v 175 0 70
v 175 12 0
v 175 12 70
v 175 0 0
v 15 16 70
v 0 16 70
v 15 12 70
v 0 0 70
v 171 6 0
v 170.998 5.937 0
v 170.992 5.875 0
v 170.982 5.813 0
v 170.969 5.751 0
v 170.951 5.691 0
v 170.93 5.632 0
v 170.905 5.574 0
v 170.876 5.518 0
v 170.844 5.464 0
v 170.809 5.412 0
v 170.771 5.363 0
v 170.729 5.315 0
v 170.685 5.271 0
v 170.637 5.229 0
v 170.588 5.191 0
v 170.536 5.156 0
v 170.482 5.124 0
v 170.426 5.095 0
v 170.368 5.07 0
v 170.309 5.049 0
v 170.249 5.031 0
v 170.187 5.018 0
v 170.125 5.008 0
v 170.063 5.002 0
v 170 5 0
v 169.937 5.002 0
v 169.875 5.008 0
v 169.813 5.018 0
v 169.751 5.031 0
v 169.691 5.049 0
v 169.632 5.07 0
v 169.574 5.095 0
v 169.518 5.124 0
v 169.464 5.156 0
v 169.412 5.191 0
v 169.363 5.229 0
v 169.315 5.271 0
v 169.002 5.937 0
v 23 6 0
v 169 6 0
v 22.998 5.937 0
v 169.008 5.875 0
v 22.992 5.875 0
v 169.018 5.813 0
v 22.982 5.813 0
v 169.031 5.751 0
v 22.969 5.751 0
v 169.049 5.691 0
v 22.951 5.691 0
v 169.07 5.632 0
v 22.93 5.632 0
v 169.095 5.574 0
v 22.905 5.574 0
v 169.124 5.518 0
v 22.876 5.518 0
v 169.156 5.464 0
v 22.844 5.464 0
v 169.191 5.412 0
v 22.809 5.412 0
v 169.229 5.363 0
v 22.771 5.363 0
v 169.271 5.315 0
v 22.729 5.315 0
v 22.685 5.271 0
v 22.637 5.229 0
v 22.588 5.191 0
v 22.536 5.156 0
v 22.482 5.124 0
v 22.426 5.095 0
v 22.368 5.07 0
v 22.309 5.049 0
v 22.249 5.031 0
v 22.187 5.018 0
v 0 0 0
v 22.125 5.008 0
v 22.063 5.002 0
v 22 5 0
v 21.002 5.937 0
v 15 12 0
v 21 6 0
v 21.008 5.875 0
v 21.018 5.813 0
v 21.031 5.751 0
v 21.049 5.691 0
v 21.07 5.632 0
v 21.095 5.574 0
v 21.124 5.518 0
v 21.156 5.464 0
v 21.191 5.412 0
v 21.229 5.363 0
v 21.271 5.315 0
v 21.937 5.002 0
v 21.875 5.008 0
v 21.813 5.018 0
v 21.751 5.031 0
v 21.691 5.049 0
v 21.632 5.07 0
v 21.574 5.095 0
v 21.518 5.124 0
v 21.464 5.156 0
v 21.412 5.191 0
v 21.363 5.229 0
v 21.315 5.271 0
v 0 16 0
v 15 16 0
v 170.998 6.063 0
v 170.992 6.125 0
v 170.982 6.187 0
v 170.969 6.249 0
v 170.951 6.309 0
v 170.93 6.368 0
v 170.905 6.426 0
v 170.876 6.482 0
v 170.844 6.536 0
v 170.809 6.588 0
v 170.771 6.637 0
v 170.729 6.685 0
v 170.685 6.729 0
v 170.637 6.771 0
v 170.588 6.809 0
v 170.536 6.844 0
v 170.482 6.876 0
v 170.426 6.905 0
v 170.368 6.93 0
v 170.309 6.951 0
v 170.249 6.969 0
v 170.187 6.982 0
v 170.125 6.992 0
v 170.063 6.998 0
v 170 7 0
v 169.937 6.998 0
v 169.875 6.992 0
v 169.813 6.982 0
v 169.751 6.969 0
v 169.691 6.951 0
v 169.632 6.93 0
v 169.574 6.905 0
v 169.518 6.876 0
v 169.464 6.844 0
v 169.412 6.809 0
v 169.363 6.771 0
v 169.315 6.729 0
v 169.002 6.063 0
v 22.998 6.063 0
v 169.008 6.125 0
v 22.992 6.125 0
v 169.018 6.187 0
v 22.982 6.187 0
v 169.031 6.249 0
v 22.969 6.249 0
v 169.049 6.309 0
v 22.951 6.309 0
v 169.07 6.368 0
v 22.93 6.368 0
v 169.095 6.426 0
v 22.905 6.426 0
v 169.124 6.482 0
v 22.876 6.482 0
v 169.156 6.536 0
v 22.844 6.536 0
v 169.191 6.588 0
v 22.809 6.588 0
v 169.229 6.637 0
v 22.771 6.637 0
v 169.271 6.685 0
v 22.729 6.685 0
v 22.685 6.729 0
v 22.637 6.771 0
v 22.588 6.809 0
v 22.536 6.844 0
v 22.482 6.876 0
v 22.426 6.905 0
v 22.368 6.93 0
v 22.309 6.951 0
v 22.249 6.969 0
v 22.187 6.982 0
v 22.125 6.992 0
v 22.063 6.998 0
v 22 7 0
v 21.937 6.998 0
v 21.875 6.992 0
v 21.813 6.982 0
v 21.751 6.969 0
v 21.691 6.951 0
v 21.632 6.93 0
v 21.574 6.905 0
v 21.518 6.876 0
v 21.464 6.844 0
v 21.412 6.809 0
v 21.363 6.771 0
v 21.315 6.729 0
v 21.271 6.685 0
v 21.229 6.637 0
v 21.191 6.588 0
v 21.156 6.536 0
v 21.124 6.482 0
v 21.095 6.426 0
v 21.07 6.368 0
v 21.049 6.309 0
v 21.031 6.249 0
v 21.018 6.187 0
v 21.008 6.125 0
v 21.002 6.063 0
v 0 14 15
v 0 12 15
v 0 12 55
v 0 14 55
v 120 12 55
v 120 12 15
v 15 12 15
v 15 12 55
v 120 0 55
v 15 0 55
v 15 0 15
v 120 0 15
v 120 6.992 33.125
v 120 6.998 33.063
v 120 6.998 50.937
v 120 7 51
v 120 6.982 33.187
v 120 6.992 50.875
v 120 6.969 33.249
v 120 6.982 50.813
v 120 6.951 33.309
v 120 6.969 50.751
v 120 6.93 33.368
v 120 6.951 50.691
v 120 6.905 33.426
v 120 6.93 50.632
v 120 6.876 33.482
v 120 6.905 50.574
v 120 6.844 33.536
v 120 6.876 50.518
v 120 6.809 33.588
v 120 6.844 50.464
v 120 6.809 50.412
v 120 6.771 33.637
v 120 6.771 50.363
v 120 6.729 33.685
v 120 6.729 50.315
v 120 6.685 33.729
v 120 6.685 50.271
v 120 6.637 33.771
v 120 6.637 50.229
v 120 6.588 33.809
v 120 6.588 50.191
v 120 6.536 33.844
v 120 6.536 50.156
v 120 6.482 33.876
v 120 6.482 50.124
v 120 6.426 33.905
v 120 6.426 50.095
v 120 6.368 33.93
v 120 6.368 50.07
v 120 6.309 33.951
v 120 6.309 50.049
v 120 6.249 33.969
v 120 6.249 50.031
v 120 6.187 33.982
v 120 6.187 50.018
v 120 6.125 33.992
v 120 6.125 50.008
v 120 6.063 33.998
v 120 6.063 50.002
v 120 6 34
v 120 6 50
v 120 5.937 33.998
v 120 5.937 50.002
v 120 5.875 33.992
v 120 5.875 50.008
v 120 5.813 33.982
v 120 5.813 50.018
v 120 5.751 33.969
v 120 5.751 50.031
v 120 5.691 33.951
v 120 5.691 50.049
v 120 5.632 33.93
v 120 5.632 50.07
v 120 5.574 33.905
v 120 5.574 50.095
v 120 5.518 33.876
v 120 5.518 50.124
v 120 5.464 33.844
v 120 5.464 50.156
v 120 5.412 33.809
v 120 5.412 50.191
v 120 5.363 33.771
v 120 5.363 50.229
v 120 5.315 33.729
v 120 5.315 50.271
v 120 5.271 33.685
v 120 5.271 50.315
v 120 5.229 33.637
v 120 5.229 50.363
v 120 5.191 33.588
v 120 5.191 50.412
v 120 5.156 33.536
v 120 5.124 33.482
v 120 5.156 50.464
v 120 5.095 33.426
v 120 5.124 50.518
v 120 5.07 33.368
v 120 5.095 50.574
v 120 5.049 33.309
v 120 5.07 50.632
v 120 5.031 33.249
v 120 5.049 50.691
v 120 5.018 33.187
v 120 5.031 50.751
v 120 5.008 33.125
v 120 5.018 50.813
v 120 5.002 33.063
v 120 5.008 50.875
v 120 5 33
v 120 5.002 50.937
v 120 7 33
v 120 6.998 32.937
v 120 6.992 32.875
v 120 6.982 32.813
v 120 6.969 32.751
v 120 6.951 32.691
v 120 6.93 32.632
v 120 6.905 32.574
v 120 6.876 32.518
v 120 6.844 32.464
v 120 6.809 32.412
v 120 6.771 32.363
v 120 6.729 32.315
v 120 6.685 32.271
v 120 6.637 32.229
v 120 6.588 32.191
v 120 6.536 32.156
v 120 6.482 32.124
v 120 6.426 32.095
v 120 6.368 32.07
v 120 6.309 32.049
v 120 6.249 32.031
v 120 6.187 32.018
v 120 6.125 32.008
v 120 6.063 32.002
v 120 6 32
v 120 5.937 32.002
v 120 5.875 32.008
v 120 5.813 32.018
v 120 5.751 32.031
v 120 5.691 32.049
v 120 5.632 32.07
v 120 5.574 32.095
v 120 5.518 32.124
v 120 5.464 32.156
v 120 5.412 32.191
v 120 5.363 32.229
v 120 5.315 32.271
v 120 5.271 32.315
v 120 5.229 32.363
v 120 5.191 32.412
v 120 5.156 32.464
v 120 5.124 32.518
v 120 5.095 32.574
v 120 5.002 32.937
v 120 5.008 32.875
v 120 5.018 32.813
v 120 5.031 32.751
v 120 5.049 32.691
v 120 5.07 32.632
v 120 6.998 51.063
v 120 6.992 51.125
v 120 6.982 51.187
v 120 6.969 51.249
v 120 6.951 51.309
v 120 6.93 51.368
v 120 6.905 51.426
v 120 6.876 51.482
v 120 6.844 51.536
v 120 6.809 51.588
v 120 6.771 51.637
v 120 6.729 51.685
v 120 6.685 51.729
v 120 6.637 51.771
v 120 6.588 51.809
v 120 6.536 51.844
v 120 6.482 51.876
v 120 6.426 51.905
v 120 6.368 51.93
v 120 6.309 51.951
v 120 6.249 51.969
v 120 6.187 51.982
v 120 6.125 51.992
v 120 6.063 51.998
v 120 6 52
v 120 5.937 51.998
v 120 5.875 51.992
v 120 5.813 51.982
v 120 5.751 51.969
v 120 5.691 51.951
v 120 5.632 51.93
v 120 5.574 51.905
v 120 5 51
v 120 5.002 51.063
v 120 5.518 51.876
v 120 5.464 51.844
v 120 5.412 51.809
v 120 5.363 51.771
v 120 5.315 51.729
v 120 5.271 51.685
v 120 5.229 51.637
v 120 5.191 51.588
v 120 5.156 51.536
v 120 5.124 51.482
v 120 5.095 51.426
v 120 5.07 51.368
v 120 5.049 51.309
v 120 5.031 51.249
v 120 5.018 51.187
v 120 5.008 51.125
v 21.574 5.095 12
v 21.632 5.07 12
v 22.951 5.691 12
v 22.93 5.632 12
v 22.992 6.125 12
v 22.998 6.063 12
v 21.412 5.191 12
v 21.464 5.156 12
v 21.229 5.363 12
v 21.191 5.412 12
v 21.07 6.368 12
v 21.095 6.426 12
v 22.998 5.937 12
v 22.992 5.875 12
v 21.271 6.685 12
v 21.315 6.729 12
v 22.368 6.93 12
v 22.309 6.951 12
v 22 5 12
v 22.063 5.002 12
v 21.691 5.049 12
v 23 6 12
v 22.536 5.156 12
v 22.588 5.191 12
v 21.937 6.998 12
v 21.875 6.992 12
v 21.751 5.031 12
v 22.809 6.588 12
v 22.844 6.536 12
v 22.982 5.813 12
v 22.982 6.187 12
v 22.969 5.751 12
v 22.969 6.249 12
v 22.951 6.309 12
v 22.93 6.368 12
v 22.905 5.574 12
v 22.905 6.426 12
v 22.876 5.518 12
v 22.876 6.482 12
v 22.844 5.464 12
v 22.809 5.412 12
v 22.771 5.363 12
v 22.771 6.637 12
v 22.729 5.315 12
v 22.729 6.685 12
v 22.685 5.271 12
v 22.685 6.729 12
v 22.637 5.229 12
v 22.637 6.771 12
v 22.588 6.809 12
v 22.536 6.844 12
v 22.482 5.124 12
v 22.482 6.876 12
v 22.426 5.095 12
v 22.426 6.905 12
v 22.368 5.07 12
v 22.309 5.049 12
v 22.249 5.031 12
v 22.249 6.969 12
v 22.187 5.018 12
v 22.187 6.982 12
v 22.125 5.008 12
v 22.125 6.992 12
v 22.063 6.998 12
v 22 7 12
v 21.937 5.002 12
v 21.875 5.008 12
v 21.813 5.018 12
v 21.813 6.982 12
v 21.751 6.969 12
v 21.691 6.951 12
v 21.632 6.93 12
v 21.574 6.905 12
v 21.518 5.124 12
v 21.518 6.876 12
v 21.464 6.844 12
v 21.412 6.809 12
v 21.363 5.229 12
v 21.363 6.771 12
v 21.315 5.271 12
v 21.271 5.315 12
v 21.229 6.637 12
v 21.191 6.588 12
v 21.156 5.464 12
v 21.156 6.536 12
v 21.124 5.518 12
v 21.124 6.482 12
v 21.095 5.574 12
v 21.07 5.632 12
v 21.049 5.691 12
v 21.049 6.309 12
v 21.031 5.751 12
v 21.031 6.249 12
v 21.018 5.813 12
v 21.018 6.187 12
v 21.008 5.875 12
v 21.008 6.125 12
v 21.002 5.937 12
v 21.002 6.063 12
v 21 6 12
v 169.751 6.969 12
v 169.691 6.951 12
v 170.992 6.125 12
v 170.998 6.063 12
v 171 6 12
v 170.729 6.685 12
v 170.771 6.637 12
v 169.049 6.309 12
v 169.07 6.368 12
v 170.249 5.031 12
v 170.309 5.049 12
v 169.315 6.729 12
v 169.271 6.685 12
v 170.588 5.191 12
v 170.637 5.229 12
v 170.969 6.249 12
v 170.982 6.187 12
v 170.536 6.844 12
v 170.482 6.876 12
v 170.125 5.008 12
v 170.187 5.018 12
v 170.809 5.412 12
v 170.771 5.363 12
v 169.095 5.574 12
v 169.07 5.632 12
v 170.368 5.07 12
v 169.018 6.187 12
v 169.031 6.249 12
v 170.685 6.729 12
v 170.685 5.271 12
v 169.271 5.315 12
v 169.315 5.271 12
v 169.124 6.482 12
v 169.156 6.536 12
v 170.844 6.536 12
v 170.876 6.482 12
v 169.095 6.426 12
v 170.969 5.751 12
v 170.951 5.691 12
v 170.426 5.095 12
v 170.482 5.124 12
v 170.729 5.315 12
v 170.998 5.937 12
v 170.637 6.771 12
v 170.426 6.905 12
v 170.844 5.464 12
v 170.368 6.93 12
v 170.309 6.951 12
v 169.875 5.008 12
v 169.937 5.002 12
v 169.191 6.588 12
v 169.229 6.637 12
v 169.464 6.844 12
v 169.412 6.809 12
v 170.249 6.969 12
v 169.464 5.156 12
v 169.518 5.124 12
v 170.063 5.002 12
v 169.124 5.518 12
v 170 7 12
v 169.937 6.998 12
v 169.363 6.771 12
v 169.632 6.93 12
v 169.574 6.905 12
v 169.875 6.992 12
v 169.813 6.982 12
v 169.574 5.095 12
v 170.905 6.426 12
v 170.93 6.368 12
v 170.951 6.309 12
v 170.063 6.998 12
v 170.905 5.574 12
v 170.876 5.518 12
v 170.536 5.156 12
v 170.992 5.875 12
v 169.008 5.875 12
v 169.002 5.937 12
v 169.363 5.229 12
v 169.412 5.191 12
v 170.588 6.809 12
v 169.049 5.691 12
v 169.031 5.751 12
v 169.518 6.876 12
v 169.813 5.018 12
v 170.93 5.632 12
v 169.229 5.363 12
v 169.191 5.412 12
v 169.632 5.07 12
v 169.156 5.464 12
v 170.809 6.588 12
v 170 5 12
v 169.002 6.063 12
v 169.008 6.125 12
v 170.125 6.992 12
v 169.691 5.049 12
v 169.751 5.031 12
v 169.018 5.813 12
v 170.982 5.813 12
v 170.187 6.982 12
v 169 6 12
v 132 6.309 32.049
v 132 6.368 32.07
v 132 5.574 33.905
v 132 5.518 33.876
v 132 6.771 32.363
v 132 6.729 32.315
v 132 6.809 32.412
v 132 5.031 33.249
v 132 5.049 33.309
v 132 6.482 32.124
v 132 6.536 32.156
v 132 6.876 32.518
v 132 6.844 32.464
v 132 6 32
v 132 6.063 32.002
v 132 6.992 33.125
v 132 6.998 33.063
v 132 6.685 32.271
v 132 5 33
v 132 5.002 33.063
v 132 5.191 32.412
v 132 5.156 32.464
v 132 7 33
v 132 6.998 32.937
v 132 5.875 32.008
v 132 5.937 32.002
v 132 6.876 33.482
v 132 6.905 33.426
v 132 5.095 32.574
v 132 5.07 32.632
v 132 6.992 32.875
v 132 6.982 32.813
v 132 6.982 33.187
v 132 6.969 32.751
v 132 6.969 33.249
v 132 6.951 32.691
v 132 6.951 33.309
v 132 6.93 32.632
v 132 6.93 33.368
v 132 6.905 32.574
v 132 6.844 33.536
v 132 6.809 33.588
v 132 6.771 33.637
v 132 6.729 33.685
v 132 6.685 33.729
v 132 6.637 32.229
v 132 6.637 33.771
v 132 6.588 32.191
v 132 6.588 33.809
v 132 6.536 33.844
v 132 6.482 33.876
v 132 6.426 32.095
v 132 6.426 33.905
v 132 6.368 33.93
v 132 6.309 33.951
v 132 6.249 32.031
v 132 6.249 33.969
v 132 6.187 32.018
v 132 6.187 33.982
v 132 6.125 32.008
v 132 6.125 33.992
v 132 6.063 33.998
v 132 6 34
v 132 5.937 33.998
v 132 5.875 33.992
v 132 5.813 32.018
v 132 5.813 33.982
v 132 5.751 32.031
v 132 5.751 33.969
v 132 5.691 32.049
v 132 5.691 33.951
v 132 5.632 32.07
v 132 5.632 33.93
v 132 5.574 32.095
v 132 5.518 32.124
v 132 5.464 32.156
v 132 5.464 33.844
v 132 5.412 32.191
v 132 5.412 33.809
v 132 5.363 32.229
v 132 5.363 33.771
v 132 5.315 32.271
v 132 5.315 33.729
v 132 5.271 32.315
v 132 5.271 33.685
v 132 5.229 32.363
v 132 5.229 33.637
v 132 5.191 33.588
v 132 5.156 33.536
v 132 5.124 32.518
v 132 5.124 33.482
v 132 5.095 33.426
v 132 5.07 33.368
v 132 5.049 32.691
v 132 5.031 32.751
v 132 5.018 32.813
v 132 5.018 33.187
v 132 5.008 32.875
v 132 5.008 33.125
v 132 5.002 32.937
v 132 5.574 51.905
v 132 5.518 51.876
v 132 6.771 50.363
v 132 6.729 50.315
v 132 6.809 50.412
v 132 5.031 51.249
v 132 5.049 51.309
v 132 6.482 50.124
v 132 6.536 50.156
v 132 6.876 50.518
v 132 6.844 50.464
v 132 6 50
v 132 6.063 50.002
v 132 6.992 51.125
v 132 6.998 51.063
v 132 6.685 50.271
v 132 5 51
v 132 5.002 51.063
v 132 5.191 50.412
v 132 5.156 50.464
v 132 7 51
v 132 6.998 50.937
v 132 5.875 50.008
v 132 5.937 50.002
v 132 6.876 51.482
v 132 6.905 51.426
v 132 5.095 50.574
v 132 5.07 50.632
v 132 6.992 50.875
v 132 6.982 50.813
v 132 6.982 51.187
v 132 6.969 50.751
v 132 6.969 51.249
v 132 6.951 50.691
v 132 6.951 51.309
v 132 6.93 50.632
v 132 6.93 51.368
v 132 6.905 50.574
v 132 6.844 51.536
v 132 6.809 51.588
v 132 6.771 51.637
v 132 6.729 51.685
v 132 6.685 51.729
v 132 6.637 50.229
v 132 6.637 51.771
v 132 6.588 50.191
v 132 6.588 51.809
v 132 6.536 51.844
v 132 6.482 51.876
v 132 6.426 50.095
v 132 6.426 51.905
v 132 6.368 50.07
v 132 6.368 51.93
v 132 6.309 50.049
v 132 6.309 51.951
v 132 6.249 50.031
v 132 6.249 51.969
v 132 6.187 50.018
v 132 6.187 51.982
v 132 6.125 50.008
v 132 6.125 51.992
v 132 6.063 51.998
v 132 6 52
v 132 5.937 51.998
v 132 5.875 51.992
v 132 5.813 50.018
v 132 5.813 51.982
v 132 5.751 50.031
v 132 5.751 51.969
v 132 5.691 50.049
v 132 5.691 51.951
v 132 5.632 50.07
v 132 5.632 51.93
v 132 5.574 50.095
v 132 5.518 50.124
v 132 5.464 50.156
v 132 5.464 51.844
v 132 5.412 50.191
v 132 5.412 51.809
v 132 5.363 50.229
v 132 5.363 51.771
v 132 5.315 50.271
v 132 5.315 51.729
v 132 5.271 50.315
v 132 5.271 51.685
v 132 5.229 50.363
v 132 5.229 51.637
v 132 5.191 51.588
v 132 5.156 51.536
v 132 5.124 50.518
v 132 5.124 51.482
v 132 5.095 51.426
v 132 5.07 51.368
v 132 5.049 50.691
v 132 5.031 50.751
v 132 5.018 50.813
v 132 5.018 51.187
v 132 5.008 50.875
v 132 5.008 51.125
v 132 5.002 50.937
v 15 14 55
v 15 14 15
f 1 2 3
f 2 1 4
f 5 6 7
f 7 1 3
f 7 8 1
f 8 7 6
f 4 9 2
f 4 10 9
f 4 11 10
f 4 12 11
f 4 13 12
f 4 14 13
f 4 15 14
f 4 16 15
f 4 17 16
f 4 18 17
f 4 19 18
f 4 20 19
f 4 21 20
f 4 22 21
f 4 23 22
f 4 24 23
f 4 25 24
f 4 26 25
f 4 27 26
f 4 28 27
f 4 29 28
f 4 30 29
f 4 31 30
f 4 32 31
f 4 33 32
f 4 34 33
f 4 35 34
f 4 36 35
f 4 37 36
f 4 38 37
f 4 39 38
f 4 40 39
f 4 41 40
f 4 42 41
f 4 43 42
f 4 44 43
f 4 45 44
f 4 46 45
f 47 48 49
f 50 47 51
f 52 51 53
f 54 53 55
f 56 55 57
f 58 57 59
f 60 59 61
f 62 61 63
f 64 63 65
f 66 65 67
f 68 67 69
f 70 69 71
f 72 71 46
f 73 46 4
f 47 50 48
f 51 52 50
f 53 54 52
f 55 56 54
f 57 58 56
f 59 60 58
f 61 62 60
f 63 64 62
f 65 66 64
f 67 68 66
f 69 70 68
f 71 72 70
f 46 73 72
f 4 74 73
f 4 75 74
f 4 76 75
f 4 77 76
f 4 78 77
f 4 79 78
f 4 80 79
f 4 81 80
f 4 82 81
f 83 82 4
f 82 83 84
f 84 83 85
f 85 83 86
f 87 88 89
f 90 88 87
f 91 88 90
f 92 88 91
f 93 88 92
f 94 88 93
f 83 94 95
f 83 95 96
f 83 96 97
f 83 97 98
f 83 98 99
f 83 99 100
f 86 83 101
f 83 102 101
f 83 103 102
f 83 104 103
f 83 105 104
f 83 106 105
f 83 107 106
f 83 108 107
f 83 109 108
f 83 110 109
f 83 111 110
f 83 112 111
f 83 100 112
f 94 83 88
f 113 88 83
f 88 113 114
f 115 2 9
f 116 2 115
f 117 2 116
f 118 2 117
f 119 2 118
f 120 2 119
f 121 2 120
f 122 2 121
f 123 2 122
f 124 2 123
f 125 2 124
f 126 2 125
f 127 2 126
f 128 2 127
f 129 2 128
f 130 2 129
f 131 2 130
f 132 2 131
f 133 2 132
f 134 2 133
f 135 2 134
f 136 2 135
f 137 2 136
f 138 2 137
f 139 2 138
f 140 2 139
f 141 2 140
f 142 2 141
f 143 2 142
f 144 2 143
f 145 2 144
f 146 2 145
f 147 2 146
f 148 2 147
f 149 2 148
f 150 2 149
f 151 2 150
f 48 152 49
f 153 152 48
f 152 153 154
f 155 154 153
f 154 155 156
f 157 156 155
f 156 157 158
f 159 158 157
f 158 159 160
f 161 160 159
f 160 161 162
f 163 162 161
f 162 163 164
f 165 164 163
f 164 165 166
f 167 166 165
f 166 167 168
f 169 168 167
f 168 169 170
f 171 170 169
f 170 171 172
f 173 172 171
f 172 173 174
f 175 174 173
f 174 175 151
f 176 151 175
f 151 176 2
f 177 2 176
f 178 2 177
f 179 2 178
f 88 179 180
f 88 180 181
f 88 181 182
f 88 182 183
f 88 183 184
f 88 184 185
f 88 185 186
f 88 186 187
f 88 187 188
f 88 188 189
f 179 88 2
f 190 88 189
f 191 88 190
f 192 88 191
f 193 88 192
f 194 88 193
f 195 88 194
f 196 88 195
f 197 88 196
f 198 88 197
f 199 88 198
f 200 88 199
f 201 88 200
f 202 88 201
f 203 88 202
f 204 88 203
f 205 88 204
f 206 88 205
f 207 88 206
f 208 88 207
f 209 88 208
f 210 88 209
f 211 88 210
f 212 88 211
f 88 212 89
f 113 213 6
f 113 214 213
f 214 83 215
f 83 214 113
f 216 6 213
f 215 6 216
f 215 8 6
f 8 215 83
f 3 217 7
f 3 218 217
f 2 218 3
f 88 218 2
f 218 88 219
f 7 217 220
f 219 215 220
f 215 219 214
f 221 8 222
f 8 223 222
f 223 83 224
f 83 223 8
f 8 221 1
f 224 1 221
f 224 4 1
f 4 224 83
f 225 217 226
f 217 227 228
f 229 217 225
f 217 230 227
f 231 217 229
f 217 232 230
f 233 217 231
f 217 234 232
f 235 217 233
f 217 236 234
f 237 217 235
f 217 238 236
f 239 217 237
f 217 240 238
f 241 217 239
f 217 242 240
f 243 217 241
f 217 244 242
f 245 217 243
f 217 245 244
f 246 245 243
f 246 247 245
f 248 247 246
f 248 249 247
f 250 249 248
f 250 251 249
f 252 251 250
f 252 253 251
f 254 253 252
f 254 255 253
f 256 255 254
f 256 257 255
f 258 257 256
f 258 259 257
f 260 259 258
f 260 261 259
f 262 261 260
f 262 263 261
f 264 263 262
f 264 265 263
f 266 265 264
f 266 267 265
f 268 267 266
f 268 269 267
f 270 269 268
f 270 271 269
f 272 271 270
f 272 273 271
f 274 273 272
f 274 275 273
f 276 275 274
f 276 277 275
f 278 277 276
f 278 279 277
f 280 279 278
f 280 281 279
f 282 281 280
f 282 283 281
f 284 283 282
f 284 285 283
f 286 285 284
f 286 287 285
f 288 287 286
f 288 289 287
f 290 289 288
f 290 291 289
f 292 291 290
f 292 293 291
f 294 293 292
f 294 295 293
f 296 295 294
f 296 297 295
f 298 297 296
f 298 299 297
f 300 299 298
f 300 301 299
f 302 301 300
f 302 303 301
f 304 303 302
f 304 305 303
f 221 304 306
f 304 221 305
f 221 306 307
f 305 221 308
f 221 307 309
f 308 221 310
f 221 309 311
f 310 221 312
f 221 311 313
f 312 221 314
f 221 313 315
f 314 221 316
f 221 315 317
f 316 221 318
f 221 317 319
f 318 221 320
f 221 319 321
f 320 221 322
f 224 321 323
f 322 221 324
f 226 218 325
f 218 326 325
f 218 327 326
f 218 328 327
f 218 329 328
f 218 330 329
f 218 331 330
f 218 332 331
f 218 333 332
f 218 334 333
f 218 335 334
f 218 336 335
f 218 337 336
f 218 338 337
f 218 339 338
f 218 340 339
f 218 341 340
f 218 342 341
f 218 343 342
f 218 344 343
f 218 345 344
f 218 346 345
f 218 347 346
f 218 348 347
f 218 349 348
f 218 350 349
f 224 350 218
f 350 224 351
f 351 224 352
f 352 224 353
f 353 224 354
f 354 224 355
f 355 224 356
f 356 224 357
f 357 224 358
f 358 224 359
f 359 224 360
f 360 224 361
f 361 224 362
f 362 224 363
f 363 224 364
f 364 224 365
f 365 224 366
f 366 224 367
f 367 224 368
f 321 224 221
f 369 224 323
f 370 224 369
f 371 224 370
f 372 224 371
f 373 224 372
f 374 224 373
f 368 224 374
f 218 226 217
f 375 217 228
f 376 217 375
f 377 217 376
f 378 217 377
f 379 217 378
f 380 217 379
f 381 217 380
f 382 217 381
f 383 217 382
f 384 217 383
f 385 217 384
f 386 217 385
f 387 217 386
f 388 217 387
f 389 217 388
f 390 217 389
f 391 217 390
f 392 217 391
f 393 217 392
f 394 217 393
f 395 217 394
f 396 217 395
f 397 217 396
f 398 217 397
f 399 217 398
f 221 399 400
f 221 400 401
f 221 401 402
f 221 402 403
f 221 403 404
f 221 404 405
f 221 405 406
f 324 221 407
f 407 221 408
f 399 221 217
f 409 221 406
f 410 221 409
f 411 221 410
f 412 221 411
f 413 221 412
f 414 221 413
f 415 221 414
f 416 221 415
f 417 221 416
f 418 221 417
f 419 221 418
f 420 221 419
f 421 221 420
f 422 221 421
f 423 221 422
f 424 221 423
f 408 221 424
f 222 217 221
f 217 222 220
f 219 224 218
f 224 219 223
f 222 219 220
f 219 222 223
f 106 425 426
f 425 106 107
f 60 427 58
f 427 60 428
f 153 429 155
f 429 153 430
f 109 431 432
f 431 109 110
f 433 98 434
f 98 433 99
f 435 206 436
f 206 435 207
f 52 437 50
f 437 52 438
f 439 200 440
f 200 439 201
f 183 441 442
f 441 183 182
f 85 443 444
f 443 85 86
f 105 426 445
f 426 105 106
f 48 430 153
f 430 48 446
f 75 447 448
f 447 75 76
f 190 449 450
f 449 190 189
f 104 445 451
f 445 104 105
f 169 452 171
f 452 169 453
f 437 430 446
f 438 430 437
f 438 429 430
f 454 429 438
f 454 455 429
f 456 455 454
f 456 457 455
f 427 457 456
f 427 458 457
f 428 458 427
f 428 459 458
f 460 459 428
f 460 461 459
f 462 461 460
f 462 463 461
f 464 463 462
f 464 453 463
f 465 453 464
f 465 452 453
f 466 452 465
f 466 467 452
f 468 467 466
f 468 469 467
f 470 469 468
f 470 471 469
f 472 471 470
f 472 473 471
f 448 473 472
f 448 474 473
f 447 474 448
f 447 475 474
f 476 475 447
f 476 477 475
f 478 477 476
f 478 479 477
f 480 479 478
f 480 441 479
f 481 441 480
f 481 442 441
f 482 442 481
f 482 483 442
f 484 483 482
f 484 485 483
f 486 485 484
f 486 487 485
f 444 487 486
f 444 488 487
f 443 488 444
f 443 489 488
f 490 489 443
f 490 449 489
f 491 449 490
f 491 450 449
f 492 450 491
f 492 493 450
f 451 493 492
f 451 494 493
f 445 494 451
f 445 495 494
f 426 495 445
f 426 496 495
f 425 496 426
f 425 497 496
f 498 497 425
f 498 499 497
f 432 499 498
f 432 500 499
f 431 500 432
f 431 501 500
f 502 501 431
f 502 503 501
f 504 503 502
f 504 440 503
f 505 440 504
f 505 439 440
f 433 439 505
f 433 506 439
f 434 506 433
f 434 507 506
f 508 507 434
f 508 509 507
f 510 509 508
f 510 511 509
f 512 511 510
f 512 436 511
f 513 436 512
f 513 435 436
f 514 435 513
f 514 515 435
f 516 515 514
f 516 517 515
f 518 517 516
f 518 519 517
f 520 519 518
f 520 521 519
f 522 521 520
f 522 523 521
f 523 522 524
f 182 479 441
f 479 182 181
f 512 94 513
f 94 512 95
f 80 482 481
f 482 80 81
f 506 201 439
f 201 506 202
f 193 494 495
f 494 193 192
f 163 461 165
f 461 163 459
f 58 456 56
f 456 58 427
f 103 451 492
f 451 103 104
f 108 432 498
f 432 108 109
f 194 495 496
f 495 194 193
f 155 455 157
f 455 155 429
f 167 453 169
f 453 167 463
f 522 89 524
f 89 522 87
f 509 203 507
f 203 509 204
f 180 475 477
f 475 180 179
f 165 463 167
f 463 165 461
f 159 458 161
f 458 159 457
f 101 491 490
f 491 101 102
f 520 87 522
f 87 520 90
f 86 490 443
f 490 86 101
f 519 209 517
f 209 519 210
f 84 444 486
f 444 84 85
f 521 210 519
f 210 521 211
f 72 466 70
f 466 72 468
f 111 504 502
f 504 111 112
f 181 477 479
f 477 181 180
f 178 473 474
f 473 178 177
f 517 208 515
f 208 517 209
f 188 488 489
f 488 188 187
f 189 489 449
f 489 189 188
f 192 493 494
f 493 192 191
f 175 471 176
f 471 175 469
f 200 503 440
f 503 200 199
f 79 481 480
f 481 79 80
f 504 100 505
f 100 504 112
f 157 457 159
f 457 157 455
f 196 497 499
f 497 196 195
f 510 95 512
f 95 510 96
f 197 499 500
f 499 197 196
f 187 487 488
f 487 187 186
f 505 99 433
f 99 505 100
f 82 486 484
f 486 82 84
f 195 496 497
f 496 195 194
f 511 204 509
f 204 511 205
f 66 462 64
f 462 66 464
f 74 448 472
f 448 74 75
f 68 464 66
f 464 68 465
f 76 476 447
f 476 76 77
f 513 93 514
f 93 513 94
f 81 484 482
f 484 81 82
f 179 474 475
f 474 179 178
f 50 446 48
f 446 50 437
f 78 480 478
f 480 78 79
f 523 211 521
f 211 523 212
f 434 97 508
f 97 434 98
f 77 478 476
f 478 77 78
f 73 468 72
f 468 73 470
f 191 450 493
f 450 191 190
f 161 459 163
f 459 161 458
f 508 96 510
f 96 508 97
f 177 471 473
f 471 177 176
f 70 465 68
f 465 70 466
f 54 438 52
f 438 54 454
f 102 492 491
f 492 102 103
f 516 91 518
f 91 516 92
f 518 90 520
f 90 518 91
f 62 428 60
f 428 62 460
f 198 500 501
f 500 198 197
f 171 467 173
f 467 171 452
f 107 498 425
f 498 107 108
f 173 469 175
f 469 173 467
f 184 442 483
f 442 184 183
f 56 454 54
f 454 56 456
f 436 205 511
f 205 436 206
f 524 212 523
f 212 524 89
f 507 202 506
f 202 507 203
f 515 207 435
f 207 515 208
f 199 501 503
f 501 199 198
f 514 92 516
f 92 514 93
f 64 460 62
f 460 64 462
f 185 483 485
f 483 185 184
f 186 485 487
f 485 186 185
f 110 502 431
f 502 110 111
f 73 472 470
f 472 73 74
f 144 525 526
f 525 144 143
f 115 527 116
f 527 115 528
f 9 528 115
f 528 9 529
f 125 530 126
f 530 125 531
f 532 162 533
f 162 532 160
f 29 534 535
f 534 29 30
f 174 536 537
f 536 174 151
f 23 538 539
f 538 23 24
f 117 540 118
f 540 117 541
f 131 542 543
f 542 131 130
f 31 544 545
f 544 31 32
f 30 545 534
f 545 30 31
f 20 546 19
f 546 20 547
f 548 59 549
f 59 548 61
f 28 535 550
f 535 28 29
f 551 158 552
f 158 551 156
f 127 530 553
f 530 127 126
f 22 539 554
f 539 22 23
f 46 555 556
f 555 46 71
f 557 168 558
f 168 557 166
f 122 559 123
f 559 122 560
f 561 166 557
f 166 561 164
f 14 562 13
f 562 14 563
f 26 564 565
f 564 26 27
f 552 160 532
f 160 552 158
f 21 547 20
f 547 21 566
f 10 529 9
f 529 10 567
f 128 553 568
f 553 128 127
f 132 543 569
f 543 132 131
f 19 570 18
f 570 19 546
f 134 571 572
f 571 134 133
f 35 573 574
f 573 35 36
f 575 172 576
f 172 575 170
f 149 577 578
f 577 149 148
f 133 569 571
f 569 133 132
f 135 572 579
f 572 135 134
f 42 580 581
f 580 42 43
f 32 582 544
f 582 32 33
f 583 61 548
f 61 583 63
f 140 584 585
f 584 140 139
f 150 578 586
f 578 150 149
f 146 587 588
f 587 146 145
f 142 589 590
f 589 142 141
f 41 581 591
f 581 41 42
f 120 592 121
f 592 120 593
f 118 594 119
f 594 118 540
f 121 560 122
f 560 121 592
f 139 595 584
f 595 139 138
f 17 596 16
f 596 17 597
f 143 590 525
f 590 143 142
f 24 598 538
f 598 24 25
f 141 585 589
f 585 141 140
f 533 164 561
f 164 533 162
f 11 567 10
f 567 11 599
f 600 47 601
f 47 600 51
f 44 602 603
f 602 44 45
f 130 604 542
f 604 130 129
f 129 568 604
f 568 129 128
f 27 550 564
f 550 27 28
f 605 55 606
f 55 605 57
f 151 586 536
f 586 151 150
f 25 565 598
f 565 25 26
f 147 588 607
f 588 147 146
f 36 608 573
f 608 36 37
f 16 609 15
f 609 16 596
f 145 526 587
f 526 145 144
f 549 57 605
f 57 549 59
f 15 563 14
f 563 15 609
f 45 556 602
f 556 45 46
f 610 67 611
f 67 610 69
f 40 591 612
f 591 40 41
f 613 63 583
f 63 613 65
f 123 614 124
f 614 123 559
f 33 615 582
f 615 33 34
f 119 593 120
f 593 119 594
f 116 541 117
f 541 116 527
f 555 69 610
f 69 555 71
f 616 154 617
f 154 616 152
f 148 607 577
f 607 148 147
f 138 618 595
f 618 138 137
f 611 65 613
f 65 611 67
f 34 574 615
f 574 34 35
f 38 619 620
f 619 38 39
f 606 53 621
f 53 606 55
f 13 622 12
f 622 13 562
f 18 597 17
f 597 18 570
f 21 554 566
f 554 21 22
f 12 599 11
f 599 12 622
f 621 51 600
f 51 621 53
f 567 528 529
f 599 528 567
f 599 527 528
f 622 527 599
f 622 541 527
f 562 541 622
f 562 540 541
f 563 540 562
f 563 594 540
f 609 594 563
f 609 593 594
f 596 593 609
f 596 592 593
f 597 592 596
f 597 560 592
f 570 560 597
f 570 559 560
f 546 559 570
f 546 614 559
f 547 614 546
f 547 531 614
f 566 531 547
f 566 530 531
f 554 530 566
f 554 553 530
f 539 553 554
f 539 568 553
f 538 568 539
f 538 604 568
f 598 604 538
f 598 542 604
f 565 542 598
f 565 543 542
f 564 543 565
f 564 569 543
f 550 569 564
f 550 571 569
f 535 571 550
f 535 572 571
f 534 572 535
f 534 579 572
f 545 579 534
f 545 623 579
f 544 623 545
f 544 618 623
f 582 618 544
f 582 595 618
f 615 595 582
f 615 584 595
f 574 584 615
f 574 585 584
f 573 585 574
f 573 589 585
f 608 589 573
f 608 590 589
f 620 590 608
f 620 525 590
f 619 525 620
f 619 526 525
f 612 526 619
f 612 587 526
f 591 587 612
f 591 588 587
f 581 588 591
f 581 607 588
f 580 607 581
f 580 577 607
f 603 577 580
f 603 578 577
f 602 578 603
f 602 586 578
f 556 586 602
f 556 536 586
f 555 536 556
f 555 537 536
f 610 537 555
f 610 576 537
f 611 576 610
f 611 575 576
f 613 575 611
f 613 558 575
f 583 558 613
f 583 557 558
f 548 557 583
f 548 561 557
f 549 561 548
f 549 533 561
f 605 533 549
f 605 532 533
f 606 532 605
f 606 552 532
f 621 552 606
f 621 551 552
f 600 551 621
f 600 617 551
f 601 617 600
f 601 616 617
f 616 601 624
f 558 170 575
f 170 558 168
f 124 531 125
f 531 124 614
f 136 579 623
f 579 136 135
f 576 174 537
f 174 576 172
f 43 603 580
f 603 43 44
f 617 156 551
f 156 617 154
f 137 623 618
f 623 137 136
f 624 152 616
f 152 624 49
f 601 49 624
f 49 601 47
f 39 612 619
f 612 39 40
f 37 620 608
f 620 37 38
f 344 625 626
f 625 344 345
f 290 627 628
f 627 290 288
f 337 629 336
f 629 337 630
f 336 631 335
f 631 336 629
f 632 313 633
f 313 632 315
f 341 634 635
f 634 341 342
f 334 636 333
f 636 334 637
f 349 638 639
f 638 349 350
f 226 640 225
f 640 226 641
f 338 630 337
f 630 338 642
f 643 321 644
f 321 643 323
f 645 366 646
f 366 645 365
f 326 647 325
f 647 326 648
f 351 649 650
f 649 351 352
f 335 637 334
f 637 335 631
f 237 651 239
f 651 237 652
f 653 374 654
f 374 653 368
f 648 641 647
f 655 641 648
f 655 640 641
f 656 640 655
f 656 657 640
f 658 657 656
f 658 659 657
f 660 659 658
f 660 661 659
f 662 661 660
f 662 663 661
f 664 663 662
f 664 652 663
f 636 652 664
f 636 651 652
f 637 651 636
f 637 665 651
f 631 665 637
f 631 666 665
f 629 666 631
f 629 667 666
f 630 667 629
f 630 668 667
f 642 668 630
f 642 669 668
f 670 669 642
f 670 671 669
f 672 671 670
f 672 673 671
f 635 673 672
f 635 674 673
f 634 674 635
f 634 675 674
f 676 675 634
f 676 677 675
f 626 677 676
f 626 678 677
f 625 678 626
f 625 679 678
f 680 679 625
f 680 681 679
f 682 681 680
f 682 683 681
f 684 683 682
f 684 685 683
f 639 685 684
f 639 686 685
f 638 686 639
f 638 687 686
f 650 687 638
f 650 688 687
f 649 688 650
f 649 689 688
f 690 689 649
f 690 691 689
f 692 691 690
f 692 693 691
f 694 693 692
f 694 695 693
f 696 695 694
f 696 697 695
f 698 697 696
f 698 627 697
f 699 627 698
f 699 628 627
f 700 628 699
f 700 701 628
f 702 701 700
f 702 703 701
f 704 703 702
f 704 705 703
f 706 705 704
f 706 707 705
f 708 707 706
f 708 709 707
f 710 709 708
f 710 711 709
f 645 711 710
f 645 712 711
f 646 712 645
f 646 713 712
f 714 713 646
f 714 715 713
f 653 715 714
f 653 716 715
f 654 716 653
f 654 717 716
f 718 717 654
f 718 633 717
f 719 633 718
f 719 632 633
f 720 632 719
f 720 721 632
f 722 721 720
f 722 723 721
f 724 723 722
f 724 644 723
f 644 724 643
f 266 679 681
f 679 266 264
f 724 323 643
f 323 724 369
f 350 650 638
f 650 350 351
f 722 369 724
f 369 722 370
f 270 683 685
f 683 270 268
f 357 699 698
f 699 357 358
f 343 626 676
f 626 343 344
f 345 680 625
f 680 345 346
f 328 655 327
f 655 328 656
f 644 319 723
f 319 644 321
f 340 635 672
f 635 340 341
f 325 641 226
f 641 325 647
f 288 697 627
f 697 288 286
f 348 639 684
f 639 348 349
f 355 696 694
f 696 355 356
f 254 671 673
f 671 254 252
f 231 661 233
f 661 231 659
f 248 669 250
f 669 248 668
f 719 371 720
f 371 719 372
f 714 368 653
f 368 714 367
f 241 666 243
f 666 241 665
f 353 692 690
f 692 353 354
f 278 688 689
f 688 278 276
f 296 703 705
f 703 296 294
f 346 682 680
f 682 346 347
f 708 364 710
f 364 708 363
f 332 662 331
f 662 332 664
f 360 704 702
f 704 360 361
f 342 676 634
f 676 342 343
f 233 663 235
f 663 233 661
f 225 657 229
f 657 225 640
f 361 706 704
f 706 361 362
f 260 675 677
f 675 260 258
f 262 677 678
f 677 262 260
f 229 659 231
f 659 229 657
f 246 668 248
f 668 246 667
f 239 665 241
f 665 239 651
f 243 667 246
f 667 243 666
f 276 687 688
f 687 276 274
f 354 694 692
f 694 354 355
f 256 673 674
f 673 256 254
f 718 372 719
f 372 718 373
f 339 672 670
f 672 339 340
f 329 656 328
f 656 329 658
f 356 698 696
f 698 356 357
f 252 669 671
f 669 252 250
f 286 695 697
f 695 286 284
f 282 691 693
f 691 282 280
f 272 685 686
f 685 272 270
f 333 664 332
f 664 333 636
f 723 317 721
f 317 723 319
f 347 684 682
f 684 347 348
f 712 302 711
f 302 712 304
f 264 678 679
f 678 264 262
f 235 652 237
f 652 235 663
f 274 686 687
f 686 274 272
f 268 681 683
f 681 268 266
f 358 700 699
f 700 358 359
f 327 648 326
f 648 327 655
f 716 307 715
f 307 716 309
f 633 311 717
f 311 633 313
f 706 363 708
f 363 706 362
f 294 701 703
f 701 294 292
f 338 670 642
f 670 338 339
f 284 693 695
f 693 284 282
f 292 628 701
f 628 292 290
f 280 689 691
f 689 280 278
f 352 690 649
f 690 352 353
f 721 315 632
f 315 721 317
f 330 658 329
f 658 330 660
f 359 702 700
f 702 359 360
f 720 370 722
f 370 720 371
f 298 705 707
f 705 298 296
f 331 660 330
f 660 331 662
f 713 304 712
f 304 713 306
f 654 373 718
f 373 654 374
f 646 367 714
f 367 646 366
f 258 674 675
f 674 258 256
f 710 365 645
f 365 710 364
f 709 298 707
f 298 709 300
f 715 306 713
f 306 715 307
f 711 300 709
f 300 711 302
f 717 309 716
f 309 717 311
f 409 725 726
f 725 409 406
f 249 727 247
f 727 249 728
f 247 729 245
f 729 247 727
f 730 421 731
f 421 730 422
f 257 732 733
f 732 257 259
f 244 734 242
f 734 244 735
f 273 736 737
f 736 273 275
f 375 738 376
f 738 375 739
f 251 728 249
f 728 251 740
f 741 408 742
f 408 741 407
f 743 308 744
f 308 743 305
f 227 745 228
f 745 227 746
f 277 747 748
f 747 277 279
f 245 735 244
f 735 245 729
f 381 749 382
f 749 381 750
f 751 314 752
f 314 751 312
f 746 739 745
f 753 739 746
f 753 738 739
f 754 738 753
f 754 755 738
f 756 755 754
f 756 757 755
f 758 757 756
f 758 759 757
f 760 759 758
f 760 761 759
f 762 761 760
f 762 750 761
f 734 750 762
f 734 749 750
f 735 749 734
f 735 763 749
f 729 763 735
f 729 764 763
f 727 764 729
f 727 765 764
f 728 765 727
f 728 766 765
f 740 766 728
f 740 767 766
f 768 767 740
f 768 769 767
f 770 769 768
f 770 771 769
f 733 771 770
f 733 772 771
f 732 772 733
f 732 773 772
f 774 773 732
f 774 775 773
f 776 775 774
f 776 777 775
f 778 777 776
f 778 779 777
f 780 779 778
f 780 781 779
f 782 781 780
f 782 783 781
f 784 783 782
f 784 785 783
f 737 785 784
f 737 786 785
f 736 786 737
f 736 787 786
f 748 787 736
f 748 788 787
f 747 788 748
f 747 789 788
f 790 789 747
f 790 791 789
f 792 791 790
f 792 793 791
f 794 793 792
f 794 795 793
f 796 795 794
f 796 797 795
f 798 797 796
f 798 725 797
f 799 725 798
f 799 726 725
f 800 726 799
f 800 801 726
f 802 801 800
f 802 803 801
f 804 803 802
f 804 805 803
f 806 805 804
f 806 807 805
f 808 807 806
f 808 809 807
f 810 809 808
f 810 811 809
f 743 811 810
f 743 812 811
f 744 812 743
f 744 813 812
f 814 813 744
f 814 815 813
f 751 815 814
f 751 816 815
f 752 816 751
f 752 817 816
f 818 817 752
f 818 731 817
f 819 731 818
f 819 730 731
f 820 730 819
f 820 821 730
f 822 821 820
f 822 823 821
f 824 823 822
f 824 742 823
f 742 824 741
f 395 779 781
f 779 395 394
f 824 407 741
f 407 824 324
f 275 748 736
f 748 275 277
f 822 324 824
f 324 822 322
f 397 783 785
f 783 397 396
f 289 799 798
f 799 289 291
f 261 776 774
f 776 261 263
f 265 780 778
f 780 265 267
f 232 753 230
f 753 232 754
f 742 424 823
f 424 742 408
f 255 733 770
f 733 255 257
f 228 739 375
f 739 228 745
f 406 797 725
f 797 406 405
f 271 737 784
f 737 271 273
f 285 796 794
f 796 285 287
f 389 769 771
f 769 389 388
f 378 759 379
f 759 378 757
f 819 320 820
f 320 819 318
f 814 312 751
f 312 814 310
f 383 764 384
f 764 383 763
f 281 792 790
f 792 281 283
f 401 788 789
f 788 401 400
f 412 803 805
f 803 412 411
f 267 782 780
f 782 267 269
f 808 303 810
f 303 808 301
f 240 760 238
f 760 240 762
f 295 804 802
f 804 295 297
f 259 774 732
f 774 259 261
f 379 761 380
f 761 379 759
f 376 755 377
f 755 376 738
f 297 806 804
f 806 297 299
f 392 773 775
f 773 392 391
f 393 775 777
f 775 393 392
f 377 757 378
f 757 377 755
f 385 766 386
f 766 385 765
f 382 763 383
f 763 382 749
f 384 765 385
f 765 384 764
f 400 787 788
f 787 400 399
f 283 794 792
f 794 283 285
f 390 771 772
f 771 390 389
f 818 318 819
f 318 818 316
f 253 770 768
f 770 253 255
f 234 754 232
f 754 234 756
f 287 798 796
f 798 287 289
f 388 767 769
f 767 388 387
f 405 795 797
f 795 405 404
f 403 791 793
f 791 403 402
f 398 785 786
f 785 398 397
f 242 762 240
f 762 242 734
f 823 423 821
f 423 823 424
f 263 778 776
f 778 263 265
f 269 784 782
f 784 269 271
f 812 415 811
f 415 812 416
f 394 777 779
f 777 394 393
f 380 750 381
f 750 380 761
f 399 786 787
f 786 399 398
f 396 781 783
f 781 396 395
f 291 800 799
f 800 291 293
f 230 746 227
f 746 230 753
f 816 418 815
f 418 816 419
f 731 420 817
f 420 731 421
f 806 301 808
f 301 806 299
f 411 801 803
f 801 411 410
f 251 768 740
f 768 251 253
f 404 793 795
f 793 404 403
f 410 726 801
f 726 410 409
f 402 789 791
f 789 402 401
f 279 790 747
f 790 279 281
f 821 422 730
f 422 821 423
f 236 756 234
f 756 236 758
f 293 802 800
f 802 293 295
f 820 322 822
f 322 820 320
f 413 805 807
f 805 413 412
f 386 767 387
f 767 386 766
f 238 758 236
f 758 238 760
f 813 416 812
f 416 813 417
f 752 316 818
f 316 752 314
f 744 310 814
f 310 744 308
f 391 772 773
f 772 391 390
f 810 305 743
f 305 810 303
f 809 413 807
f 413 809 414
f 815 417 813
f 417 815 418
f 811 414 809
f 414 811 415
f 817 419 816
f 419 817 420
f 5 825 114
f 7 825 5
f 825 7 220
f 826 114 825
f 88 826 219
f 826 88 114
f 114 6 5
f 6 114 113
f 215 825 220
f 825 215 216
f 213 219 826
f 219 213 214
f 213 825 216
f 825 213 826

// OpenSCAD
// Overall bracket dims
width = 175;
thickness = 12;
height = 70;

// Position of mounting holes, measured from nearest edge
mounting_hole_1 = 22;
mounting_hole_2 = width - 5;

// GPU dims
cooler_height = 15;     // Height above top of PCI bracket

// PCI dims
pci_length = 120;
pci_height = 40;
pci_edge = 15;
pci_thickness = 2;

// PCI mounting holes
pci_hole_1 = 18;
pci_hole_2 = 36;
pci_hole_in = 6;

// Screw hole size
hole_size = 2;          // Sized to fit 3mm self-tapping screw.
hole_depth = 12;

lower_height = height - cooler_height - pci_height;
$fn = 100;

module bracket_gen() {
    union() {
        difference() {
            cube([width, thickness, height]);
            translate([pci_edge, 0, cooler_height]) {
                cube([pci_length-pci_edge, thickness, pci_height]);
            }
            translate([mounting_hole_1, thickness/2, 0]) {
                cylinder(h = hole_depth, d = hole_size);
            }
            translate([mounting_hole_2, thickness/2, 0]) {
                cylinder(h = hole_depth, d = hole_size);
            }
            translate([pci_length, thickness - pci_hole_in, cooler_height + pci_hole_1]) {
                rotate([0, 90, 0]) {
                    cylinder(h = hole_depth, d = hole_size);
                }
            } 
            translate([pci_length, thickness - pci_hole_in, cooler_height + pci_hole_2]) {
                rotate([0, 90, 0]) {
                    cylinder(h = hole_depth, d = hole_size);
                }
            } 
        }
        translate([0, thickness, 0]) {
            difference() {
                cube([pci_edge, pci_thickness*2, height]);
                translate([0, 0, cooler_height]) {
                    cube([pci_edge, pci_thickness, pci_height]);
                }
            }
        }        
    }
}

bracket_gen();
